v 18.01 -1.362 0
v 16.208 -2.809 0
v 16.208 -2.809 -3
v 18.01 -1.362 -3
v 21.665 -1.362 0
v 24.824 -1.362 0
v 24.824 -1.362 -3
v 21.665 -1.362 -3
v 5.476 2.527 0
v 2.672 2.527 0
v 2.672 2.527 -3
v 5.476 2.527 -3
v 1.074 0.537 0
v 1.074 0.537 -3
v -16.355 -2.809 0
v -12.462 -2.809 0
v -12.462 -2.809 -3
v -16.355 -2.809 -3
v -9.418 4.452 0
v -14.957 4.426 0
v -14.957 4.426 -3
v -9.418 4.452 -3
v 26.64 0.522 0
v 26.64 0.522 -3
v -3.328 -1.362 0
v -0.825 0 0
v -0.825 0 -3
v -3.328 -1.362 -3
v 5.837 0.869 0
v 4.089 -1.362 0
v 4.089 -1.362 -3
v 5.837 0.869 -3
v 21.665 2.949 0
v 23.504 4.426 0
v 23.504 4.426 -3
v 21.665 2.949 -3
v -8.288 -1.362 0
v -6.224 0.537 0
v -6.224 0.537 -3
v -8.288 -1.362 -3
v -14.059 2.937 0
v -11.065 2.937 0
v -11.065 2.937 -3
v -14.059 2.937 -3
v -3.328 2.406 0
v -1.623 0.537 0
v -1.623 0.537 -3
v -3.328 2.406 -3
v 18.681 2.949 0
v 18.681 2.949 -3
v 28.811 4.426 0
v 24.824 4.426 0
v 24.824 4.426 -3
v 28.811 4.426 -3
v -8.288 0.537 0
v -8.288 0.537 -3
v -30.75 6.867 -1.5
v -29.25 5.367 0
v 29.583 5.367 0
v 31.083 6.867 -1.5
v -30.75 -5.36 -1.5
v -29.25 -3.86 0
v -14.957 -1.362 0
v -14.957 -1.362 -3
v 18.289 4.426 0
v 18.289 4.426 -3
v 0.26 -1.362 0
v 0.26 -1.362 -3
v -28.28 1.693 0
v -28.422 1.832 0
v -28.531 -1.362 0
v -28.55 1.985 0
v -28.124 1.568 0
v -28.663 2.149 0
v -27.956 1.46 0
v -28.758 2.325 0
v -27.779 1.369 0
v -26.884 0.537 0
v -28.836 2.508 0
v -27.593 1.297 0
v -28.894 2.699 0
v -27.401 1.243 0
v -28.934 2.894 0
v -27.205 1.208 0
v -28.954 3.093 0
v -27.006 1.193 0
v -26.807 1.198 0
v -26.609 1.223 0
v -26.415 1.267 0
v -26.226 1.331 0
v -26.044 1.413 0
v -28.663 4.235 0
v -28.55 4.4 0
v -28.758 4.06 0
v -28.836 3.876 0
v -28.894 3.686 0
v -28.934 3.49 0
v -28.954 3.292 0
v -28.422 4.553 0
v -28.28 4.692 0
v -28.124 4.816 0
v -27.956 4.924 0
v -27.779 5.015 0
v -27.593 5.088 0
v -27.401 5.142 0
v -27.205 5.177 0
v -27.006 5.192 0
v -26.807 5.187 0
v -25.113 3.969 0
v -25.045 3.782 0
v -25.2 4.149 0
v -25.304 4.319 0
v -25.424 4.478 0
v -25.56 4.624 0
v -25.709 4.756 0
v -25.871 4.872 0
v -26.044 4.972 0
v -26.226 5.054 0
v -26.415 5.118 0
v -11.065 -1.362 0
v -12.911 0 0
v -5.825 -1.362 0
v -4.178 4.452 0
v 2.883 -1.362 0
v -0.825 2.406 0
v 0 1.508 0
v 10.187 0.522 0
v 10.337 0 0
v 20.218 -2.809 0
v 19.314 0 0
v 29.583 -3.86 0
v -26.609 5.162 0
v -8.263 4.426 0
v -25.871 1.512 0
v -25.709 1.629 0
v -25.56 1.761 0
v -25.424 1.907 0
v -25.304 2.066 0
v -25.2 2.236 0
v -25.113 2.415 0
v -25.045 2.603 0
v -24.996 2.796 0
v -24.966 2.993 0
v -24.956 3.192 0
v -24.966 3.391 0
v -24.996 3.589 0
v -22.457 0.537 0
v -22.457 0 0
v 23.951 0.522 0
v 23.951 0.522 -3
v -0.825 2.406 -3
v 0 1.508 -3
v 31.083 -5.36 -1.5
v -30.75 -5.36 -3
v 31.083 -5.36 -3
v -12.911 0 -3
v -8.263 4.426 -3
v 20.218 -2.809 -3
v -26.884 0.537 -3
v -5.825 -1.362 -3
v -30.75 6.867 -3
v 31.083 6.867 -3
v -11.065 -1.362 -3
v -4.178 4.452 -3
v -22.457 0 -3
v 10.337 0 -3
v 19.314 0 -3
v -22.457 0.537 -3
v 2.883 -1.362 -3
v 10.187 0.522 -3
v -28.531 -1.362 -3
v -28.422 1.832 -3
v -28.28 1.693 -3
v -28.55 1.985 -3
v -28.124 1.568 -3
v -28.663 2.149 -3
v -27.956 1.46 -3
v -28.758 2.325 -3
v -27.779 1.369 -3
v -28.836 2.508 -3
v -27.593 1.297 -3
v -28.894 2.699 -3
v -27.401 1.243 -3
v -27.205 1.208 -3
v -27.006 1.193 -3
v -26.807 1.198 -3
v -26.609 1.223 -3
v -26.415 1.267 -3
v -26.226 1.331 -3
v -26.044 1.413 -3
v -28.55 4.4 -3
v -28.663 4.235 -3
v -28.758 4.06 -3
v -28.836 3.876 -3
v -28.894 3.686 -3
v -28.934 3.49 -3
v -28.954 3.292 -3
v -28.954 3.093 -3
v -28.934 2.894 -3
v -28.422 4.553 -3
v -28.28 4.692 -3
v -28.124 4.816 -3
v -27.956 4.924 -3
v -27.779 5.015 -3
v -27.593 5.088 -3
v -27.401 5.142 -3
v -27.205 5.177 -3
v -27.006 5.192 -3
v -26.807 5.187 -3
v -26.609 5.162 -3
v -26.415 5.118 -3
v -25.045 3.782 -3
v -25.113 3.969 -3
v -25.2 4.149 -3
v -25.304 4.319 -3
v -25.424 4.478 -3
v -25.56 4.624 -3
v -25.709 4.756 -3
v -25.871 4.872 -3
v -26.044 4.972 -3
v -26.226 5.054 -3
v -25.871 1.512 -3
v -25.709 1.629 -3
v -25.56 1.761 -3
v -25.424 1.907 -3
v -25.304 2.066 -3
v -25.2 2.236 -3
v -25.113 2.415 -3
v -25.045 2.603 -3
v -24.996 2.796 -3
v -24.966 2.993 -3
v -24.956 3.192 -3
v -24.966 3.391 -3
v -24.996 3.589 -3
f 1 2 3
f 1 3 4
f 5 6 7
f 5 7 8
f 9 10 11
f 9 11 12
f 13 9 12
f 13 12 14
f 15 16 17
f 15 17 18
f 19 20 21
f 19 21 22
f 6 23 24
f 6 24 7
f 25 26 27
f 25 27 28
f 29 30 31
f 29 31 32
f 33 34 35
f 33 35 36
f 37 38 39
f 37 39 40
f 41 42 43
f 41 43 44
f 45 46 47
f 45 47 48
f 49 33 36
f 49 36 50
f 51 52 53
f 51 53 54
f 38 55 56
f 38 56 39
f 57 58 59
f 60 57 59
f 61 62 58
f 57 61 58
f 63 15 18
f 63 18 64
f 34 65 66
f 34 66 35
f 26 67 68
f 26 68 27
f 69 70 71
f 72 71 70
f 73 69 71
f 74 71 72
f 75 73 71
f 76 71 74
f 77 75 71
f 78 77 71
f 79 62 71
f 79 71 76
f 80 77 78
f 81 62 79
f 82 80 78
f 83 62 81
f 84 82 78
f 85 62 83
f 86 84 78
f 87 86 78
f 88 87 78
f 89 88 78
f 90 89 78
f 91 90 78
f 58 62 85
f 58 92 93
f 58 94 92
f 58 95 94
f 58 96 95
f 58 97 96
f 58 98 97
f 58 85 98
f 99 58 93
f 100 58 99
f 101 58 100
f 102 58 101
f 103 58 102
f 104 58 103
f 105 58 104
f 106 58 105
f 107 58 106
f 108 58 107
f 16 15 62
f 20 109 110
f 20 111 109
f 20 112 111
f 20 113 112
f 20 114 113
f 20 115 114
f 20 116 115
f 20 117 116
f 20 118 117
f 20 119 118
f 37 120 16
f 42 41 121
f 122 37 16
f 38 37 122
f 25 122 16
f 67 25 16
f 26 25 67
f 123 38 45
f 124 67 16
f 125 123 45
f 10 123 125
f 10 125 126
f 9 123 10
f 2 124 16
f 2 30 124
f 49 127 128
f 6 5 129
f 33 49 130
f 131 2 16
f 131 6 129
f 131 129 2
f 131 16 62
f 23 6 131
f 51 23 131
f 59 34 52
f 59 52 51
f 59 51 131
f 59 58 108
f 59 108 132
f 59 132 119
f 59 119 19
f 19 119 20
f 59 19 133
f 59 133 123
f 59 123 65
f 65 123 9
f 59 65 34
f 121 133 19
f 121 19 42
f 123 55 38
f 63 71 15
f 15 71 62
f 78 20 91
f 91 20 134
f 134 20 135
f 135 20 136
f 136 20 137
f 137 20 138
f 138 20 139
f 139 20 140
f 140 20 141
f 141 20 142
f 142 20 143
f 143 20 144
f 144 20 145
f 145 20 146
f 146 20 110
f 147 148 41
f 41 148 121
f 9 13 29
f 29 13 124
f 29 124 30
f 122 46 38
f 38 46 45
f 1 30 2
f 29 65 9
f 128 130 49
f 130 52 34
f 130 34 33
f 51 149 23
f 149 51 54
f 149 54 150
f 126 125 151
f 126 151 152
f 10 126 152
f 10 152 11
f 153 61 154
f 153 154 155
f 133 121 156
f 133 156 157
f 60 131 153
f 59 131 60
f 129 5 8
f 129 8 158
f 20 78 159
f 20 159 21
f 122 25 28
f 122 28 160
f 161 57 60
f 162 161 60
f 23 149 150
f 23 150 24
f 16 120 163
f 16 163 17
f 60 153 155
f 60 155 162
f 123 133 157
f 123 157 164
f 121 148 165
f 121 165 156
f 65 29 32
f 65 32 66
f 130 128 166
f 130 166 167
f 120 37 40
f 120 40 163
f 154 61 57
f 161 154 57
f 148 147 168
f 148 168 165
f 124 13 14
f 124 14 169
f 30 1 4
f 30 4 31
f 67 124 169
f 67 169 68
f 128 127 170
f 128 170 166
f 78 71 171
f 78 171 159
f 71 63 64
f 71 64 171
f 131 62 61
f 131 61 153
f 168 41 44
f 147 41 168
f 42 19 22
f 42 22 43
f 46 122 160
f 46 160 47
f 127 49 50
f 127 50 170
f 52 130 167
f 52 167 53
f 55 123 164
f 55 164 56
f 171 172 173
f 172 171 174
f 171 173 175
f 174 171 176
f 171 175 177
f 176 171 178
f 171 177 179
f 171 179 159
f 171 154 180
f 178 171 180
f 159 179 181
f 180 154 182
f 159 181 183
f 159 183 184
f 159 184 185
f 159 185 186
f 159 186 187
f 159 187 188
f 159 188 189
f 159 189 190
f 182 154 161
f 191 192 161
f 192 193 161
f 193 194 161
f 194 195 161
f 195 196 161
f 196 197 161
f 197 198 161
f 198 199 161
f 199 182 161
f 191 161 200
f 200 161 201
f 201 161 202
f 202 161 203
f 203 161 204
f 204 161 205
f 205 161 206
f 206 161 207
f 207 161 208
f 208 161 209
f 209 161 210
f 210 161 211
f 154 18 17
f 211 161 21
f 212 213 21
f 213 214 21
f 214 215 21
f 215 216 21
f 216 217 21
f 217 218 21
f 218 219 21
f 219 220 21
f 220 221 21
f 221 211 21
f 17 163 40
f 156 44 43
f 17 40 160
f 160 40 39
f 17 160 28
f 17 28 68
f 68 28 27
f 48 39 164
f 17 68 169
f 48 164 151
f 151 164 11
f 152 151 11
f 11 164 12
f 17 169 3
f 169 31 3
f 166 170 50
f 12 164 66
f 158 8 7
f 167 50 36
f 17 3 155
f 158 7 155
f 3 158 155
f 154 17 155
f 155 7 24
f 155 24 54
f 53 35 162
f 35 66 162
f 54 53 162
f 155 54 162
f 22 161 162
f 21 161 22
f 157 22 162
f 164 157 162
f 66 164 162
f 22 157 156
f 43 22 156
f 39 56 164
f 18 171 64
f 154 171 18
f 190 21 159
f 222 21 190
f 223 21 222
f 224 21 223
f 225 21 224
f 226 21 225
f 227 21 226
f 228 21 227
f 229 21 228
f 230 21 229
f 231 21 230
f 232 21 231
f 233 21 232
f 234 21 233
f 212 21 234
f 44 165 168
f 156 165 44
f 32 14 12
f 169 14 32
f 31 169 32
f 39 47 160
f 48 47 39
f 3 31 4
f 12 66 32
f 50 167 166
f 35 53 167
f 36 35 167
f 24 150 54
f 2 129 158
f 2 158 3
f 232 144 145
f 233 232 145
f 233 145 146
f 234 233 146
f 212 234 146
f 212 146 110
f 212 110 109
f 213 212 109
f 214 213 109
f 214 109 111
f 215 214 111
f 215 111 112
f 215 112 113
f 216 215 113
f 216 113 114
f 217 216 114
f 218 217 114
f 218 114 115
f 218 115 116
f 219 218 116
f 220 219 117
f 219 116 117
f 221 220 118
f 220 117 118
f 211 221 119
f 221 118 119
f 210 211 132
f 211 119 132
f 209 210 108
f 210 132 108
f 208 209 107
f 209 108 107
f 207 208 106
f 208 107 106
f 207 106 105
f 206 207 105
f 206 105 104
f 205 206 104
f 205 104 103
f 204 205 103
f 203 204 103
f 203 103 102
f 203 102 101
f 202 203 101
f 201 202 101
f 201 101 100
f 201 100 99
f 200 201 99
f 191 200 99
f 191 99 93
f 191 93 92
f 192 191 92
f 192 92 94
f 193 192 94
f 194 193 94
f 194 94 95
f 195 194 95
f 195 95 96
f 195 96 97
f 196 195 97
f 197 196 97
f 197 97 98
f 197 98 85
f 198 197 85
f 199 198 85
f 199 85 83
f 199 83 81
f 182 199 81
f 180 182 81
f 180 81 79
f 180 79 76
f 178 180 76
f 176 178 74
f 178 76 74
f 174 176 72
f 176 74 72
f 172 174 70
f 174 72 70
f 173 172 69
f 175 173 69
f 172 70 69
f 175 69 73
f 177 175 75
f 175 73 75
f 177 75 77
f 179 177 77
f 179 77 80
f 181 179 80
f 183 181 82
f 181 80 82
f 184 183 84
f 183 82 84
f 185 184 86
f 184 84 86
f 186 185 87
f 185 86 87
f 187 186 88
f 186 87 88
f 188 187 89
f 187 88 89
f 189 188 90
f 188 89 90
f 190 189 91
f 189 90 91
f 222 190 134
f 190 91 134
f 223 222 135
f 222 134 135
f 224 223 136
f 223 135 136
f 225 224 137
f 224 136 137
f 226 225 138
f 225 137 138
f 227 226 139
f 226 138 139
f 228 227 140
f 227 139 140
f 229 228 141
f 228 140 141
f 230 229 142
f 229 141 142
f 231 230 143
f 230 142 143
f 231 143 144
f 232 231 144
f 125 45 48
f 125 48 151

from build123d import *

# Parameters (mm, degrees)
F0_W     = 61.832226
F0_H     = 12.226711
F1_DEPTH = 3
F2_SIZE  = 1.5
F3_R     = 2
F4_DEPTH = 25


with BuildPart() as f1:
    # F0 (on Top) → F1 (new body)
    with BuildSketch(Plane.XY):
        with Locations((0.166392, 0.753395)):
            Rectangle(F0_W, F0_H)
        Polygon((0, 1.507616), (2.671845, 2.527045), (5.47565, 2.527045), (1.073979, 0.537249), (2.882884, -1.362103), (0.259971, -1.362103), (-0.825374, 0), (-3.327693, -1.362103), (-5.824599, -1.362103), (-1.623004, 0.537249), (-3.327693, 2.405905), (-0.825374, 2.405905), align=None, mode=Mode.SUBTRACT)
        Polygon((-8.263383, 4.426397), (-4.177737, 4.452007), (-8.288235, 0.537249), (-6.223839, 0.537249), (-8.288235, -1.362103), (-11.064619, -1.362103), (-12.461958, -2.809228), (-16.354544, -2.809228), (-14.957204, -1.362103), (-28.531348, -1.362103), (-26.884485, 0.537249), (-14.957204, 4.426397), (-9.417756, 4.452007), (-11.064619, 2.936808), (-14.058915, 2.936808), (-22.457372, 0.537249), (-22.457372, 0), (-12.911102, 0), align=None, mode=Mode.SUBTRACT)
        Polygon((4.088822, -1.362103), (5.837431, 0.868881), (18.288735, 4.426397), (23.504414, 4.426397), (21.665359, 2.949124), (18.680664, 2.949124), (10.187338, 0.522459), (10.336612, 0), (19.313782, 0), (24.824195, 4.426397), (28.81054, 4.426397), (23.950536, 0.522459), (26.639851, 0.522459), (24.824195, -1.362103), (21.665359, -1.362103), (20.218235, -2.809228), (16.208492, -2.809228), (18.010015, -1.362103), align=None, mode=Mode.SUBTRACT)
    extrude(amount=-F1_DEPTH)

    # F2
    f2_edges = [f1.edges().sort_by_distance(p)[0] for p in [
        (0.166392, 6.866751, 0),
        (-30.749721, 0.753396, 0),
        (0.166392, -5.35996, 0),
        (31.082505, 0.753396, 0),
    ]]
    chamfer(f2_edges, length=F2_SIZE)

    # F3 (on face) → F4 (cut)
    with BuildSketch(Plane.XY):
        with Locations((-26.956197, 3.192364)):
            Circle(F3_R)
    extrude(amount=-F4_DEPTH, mode=Mode.SUBTRACT)


solid = f1.part
